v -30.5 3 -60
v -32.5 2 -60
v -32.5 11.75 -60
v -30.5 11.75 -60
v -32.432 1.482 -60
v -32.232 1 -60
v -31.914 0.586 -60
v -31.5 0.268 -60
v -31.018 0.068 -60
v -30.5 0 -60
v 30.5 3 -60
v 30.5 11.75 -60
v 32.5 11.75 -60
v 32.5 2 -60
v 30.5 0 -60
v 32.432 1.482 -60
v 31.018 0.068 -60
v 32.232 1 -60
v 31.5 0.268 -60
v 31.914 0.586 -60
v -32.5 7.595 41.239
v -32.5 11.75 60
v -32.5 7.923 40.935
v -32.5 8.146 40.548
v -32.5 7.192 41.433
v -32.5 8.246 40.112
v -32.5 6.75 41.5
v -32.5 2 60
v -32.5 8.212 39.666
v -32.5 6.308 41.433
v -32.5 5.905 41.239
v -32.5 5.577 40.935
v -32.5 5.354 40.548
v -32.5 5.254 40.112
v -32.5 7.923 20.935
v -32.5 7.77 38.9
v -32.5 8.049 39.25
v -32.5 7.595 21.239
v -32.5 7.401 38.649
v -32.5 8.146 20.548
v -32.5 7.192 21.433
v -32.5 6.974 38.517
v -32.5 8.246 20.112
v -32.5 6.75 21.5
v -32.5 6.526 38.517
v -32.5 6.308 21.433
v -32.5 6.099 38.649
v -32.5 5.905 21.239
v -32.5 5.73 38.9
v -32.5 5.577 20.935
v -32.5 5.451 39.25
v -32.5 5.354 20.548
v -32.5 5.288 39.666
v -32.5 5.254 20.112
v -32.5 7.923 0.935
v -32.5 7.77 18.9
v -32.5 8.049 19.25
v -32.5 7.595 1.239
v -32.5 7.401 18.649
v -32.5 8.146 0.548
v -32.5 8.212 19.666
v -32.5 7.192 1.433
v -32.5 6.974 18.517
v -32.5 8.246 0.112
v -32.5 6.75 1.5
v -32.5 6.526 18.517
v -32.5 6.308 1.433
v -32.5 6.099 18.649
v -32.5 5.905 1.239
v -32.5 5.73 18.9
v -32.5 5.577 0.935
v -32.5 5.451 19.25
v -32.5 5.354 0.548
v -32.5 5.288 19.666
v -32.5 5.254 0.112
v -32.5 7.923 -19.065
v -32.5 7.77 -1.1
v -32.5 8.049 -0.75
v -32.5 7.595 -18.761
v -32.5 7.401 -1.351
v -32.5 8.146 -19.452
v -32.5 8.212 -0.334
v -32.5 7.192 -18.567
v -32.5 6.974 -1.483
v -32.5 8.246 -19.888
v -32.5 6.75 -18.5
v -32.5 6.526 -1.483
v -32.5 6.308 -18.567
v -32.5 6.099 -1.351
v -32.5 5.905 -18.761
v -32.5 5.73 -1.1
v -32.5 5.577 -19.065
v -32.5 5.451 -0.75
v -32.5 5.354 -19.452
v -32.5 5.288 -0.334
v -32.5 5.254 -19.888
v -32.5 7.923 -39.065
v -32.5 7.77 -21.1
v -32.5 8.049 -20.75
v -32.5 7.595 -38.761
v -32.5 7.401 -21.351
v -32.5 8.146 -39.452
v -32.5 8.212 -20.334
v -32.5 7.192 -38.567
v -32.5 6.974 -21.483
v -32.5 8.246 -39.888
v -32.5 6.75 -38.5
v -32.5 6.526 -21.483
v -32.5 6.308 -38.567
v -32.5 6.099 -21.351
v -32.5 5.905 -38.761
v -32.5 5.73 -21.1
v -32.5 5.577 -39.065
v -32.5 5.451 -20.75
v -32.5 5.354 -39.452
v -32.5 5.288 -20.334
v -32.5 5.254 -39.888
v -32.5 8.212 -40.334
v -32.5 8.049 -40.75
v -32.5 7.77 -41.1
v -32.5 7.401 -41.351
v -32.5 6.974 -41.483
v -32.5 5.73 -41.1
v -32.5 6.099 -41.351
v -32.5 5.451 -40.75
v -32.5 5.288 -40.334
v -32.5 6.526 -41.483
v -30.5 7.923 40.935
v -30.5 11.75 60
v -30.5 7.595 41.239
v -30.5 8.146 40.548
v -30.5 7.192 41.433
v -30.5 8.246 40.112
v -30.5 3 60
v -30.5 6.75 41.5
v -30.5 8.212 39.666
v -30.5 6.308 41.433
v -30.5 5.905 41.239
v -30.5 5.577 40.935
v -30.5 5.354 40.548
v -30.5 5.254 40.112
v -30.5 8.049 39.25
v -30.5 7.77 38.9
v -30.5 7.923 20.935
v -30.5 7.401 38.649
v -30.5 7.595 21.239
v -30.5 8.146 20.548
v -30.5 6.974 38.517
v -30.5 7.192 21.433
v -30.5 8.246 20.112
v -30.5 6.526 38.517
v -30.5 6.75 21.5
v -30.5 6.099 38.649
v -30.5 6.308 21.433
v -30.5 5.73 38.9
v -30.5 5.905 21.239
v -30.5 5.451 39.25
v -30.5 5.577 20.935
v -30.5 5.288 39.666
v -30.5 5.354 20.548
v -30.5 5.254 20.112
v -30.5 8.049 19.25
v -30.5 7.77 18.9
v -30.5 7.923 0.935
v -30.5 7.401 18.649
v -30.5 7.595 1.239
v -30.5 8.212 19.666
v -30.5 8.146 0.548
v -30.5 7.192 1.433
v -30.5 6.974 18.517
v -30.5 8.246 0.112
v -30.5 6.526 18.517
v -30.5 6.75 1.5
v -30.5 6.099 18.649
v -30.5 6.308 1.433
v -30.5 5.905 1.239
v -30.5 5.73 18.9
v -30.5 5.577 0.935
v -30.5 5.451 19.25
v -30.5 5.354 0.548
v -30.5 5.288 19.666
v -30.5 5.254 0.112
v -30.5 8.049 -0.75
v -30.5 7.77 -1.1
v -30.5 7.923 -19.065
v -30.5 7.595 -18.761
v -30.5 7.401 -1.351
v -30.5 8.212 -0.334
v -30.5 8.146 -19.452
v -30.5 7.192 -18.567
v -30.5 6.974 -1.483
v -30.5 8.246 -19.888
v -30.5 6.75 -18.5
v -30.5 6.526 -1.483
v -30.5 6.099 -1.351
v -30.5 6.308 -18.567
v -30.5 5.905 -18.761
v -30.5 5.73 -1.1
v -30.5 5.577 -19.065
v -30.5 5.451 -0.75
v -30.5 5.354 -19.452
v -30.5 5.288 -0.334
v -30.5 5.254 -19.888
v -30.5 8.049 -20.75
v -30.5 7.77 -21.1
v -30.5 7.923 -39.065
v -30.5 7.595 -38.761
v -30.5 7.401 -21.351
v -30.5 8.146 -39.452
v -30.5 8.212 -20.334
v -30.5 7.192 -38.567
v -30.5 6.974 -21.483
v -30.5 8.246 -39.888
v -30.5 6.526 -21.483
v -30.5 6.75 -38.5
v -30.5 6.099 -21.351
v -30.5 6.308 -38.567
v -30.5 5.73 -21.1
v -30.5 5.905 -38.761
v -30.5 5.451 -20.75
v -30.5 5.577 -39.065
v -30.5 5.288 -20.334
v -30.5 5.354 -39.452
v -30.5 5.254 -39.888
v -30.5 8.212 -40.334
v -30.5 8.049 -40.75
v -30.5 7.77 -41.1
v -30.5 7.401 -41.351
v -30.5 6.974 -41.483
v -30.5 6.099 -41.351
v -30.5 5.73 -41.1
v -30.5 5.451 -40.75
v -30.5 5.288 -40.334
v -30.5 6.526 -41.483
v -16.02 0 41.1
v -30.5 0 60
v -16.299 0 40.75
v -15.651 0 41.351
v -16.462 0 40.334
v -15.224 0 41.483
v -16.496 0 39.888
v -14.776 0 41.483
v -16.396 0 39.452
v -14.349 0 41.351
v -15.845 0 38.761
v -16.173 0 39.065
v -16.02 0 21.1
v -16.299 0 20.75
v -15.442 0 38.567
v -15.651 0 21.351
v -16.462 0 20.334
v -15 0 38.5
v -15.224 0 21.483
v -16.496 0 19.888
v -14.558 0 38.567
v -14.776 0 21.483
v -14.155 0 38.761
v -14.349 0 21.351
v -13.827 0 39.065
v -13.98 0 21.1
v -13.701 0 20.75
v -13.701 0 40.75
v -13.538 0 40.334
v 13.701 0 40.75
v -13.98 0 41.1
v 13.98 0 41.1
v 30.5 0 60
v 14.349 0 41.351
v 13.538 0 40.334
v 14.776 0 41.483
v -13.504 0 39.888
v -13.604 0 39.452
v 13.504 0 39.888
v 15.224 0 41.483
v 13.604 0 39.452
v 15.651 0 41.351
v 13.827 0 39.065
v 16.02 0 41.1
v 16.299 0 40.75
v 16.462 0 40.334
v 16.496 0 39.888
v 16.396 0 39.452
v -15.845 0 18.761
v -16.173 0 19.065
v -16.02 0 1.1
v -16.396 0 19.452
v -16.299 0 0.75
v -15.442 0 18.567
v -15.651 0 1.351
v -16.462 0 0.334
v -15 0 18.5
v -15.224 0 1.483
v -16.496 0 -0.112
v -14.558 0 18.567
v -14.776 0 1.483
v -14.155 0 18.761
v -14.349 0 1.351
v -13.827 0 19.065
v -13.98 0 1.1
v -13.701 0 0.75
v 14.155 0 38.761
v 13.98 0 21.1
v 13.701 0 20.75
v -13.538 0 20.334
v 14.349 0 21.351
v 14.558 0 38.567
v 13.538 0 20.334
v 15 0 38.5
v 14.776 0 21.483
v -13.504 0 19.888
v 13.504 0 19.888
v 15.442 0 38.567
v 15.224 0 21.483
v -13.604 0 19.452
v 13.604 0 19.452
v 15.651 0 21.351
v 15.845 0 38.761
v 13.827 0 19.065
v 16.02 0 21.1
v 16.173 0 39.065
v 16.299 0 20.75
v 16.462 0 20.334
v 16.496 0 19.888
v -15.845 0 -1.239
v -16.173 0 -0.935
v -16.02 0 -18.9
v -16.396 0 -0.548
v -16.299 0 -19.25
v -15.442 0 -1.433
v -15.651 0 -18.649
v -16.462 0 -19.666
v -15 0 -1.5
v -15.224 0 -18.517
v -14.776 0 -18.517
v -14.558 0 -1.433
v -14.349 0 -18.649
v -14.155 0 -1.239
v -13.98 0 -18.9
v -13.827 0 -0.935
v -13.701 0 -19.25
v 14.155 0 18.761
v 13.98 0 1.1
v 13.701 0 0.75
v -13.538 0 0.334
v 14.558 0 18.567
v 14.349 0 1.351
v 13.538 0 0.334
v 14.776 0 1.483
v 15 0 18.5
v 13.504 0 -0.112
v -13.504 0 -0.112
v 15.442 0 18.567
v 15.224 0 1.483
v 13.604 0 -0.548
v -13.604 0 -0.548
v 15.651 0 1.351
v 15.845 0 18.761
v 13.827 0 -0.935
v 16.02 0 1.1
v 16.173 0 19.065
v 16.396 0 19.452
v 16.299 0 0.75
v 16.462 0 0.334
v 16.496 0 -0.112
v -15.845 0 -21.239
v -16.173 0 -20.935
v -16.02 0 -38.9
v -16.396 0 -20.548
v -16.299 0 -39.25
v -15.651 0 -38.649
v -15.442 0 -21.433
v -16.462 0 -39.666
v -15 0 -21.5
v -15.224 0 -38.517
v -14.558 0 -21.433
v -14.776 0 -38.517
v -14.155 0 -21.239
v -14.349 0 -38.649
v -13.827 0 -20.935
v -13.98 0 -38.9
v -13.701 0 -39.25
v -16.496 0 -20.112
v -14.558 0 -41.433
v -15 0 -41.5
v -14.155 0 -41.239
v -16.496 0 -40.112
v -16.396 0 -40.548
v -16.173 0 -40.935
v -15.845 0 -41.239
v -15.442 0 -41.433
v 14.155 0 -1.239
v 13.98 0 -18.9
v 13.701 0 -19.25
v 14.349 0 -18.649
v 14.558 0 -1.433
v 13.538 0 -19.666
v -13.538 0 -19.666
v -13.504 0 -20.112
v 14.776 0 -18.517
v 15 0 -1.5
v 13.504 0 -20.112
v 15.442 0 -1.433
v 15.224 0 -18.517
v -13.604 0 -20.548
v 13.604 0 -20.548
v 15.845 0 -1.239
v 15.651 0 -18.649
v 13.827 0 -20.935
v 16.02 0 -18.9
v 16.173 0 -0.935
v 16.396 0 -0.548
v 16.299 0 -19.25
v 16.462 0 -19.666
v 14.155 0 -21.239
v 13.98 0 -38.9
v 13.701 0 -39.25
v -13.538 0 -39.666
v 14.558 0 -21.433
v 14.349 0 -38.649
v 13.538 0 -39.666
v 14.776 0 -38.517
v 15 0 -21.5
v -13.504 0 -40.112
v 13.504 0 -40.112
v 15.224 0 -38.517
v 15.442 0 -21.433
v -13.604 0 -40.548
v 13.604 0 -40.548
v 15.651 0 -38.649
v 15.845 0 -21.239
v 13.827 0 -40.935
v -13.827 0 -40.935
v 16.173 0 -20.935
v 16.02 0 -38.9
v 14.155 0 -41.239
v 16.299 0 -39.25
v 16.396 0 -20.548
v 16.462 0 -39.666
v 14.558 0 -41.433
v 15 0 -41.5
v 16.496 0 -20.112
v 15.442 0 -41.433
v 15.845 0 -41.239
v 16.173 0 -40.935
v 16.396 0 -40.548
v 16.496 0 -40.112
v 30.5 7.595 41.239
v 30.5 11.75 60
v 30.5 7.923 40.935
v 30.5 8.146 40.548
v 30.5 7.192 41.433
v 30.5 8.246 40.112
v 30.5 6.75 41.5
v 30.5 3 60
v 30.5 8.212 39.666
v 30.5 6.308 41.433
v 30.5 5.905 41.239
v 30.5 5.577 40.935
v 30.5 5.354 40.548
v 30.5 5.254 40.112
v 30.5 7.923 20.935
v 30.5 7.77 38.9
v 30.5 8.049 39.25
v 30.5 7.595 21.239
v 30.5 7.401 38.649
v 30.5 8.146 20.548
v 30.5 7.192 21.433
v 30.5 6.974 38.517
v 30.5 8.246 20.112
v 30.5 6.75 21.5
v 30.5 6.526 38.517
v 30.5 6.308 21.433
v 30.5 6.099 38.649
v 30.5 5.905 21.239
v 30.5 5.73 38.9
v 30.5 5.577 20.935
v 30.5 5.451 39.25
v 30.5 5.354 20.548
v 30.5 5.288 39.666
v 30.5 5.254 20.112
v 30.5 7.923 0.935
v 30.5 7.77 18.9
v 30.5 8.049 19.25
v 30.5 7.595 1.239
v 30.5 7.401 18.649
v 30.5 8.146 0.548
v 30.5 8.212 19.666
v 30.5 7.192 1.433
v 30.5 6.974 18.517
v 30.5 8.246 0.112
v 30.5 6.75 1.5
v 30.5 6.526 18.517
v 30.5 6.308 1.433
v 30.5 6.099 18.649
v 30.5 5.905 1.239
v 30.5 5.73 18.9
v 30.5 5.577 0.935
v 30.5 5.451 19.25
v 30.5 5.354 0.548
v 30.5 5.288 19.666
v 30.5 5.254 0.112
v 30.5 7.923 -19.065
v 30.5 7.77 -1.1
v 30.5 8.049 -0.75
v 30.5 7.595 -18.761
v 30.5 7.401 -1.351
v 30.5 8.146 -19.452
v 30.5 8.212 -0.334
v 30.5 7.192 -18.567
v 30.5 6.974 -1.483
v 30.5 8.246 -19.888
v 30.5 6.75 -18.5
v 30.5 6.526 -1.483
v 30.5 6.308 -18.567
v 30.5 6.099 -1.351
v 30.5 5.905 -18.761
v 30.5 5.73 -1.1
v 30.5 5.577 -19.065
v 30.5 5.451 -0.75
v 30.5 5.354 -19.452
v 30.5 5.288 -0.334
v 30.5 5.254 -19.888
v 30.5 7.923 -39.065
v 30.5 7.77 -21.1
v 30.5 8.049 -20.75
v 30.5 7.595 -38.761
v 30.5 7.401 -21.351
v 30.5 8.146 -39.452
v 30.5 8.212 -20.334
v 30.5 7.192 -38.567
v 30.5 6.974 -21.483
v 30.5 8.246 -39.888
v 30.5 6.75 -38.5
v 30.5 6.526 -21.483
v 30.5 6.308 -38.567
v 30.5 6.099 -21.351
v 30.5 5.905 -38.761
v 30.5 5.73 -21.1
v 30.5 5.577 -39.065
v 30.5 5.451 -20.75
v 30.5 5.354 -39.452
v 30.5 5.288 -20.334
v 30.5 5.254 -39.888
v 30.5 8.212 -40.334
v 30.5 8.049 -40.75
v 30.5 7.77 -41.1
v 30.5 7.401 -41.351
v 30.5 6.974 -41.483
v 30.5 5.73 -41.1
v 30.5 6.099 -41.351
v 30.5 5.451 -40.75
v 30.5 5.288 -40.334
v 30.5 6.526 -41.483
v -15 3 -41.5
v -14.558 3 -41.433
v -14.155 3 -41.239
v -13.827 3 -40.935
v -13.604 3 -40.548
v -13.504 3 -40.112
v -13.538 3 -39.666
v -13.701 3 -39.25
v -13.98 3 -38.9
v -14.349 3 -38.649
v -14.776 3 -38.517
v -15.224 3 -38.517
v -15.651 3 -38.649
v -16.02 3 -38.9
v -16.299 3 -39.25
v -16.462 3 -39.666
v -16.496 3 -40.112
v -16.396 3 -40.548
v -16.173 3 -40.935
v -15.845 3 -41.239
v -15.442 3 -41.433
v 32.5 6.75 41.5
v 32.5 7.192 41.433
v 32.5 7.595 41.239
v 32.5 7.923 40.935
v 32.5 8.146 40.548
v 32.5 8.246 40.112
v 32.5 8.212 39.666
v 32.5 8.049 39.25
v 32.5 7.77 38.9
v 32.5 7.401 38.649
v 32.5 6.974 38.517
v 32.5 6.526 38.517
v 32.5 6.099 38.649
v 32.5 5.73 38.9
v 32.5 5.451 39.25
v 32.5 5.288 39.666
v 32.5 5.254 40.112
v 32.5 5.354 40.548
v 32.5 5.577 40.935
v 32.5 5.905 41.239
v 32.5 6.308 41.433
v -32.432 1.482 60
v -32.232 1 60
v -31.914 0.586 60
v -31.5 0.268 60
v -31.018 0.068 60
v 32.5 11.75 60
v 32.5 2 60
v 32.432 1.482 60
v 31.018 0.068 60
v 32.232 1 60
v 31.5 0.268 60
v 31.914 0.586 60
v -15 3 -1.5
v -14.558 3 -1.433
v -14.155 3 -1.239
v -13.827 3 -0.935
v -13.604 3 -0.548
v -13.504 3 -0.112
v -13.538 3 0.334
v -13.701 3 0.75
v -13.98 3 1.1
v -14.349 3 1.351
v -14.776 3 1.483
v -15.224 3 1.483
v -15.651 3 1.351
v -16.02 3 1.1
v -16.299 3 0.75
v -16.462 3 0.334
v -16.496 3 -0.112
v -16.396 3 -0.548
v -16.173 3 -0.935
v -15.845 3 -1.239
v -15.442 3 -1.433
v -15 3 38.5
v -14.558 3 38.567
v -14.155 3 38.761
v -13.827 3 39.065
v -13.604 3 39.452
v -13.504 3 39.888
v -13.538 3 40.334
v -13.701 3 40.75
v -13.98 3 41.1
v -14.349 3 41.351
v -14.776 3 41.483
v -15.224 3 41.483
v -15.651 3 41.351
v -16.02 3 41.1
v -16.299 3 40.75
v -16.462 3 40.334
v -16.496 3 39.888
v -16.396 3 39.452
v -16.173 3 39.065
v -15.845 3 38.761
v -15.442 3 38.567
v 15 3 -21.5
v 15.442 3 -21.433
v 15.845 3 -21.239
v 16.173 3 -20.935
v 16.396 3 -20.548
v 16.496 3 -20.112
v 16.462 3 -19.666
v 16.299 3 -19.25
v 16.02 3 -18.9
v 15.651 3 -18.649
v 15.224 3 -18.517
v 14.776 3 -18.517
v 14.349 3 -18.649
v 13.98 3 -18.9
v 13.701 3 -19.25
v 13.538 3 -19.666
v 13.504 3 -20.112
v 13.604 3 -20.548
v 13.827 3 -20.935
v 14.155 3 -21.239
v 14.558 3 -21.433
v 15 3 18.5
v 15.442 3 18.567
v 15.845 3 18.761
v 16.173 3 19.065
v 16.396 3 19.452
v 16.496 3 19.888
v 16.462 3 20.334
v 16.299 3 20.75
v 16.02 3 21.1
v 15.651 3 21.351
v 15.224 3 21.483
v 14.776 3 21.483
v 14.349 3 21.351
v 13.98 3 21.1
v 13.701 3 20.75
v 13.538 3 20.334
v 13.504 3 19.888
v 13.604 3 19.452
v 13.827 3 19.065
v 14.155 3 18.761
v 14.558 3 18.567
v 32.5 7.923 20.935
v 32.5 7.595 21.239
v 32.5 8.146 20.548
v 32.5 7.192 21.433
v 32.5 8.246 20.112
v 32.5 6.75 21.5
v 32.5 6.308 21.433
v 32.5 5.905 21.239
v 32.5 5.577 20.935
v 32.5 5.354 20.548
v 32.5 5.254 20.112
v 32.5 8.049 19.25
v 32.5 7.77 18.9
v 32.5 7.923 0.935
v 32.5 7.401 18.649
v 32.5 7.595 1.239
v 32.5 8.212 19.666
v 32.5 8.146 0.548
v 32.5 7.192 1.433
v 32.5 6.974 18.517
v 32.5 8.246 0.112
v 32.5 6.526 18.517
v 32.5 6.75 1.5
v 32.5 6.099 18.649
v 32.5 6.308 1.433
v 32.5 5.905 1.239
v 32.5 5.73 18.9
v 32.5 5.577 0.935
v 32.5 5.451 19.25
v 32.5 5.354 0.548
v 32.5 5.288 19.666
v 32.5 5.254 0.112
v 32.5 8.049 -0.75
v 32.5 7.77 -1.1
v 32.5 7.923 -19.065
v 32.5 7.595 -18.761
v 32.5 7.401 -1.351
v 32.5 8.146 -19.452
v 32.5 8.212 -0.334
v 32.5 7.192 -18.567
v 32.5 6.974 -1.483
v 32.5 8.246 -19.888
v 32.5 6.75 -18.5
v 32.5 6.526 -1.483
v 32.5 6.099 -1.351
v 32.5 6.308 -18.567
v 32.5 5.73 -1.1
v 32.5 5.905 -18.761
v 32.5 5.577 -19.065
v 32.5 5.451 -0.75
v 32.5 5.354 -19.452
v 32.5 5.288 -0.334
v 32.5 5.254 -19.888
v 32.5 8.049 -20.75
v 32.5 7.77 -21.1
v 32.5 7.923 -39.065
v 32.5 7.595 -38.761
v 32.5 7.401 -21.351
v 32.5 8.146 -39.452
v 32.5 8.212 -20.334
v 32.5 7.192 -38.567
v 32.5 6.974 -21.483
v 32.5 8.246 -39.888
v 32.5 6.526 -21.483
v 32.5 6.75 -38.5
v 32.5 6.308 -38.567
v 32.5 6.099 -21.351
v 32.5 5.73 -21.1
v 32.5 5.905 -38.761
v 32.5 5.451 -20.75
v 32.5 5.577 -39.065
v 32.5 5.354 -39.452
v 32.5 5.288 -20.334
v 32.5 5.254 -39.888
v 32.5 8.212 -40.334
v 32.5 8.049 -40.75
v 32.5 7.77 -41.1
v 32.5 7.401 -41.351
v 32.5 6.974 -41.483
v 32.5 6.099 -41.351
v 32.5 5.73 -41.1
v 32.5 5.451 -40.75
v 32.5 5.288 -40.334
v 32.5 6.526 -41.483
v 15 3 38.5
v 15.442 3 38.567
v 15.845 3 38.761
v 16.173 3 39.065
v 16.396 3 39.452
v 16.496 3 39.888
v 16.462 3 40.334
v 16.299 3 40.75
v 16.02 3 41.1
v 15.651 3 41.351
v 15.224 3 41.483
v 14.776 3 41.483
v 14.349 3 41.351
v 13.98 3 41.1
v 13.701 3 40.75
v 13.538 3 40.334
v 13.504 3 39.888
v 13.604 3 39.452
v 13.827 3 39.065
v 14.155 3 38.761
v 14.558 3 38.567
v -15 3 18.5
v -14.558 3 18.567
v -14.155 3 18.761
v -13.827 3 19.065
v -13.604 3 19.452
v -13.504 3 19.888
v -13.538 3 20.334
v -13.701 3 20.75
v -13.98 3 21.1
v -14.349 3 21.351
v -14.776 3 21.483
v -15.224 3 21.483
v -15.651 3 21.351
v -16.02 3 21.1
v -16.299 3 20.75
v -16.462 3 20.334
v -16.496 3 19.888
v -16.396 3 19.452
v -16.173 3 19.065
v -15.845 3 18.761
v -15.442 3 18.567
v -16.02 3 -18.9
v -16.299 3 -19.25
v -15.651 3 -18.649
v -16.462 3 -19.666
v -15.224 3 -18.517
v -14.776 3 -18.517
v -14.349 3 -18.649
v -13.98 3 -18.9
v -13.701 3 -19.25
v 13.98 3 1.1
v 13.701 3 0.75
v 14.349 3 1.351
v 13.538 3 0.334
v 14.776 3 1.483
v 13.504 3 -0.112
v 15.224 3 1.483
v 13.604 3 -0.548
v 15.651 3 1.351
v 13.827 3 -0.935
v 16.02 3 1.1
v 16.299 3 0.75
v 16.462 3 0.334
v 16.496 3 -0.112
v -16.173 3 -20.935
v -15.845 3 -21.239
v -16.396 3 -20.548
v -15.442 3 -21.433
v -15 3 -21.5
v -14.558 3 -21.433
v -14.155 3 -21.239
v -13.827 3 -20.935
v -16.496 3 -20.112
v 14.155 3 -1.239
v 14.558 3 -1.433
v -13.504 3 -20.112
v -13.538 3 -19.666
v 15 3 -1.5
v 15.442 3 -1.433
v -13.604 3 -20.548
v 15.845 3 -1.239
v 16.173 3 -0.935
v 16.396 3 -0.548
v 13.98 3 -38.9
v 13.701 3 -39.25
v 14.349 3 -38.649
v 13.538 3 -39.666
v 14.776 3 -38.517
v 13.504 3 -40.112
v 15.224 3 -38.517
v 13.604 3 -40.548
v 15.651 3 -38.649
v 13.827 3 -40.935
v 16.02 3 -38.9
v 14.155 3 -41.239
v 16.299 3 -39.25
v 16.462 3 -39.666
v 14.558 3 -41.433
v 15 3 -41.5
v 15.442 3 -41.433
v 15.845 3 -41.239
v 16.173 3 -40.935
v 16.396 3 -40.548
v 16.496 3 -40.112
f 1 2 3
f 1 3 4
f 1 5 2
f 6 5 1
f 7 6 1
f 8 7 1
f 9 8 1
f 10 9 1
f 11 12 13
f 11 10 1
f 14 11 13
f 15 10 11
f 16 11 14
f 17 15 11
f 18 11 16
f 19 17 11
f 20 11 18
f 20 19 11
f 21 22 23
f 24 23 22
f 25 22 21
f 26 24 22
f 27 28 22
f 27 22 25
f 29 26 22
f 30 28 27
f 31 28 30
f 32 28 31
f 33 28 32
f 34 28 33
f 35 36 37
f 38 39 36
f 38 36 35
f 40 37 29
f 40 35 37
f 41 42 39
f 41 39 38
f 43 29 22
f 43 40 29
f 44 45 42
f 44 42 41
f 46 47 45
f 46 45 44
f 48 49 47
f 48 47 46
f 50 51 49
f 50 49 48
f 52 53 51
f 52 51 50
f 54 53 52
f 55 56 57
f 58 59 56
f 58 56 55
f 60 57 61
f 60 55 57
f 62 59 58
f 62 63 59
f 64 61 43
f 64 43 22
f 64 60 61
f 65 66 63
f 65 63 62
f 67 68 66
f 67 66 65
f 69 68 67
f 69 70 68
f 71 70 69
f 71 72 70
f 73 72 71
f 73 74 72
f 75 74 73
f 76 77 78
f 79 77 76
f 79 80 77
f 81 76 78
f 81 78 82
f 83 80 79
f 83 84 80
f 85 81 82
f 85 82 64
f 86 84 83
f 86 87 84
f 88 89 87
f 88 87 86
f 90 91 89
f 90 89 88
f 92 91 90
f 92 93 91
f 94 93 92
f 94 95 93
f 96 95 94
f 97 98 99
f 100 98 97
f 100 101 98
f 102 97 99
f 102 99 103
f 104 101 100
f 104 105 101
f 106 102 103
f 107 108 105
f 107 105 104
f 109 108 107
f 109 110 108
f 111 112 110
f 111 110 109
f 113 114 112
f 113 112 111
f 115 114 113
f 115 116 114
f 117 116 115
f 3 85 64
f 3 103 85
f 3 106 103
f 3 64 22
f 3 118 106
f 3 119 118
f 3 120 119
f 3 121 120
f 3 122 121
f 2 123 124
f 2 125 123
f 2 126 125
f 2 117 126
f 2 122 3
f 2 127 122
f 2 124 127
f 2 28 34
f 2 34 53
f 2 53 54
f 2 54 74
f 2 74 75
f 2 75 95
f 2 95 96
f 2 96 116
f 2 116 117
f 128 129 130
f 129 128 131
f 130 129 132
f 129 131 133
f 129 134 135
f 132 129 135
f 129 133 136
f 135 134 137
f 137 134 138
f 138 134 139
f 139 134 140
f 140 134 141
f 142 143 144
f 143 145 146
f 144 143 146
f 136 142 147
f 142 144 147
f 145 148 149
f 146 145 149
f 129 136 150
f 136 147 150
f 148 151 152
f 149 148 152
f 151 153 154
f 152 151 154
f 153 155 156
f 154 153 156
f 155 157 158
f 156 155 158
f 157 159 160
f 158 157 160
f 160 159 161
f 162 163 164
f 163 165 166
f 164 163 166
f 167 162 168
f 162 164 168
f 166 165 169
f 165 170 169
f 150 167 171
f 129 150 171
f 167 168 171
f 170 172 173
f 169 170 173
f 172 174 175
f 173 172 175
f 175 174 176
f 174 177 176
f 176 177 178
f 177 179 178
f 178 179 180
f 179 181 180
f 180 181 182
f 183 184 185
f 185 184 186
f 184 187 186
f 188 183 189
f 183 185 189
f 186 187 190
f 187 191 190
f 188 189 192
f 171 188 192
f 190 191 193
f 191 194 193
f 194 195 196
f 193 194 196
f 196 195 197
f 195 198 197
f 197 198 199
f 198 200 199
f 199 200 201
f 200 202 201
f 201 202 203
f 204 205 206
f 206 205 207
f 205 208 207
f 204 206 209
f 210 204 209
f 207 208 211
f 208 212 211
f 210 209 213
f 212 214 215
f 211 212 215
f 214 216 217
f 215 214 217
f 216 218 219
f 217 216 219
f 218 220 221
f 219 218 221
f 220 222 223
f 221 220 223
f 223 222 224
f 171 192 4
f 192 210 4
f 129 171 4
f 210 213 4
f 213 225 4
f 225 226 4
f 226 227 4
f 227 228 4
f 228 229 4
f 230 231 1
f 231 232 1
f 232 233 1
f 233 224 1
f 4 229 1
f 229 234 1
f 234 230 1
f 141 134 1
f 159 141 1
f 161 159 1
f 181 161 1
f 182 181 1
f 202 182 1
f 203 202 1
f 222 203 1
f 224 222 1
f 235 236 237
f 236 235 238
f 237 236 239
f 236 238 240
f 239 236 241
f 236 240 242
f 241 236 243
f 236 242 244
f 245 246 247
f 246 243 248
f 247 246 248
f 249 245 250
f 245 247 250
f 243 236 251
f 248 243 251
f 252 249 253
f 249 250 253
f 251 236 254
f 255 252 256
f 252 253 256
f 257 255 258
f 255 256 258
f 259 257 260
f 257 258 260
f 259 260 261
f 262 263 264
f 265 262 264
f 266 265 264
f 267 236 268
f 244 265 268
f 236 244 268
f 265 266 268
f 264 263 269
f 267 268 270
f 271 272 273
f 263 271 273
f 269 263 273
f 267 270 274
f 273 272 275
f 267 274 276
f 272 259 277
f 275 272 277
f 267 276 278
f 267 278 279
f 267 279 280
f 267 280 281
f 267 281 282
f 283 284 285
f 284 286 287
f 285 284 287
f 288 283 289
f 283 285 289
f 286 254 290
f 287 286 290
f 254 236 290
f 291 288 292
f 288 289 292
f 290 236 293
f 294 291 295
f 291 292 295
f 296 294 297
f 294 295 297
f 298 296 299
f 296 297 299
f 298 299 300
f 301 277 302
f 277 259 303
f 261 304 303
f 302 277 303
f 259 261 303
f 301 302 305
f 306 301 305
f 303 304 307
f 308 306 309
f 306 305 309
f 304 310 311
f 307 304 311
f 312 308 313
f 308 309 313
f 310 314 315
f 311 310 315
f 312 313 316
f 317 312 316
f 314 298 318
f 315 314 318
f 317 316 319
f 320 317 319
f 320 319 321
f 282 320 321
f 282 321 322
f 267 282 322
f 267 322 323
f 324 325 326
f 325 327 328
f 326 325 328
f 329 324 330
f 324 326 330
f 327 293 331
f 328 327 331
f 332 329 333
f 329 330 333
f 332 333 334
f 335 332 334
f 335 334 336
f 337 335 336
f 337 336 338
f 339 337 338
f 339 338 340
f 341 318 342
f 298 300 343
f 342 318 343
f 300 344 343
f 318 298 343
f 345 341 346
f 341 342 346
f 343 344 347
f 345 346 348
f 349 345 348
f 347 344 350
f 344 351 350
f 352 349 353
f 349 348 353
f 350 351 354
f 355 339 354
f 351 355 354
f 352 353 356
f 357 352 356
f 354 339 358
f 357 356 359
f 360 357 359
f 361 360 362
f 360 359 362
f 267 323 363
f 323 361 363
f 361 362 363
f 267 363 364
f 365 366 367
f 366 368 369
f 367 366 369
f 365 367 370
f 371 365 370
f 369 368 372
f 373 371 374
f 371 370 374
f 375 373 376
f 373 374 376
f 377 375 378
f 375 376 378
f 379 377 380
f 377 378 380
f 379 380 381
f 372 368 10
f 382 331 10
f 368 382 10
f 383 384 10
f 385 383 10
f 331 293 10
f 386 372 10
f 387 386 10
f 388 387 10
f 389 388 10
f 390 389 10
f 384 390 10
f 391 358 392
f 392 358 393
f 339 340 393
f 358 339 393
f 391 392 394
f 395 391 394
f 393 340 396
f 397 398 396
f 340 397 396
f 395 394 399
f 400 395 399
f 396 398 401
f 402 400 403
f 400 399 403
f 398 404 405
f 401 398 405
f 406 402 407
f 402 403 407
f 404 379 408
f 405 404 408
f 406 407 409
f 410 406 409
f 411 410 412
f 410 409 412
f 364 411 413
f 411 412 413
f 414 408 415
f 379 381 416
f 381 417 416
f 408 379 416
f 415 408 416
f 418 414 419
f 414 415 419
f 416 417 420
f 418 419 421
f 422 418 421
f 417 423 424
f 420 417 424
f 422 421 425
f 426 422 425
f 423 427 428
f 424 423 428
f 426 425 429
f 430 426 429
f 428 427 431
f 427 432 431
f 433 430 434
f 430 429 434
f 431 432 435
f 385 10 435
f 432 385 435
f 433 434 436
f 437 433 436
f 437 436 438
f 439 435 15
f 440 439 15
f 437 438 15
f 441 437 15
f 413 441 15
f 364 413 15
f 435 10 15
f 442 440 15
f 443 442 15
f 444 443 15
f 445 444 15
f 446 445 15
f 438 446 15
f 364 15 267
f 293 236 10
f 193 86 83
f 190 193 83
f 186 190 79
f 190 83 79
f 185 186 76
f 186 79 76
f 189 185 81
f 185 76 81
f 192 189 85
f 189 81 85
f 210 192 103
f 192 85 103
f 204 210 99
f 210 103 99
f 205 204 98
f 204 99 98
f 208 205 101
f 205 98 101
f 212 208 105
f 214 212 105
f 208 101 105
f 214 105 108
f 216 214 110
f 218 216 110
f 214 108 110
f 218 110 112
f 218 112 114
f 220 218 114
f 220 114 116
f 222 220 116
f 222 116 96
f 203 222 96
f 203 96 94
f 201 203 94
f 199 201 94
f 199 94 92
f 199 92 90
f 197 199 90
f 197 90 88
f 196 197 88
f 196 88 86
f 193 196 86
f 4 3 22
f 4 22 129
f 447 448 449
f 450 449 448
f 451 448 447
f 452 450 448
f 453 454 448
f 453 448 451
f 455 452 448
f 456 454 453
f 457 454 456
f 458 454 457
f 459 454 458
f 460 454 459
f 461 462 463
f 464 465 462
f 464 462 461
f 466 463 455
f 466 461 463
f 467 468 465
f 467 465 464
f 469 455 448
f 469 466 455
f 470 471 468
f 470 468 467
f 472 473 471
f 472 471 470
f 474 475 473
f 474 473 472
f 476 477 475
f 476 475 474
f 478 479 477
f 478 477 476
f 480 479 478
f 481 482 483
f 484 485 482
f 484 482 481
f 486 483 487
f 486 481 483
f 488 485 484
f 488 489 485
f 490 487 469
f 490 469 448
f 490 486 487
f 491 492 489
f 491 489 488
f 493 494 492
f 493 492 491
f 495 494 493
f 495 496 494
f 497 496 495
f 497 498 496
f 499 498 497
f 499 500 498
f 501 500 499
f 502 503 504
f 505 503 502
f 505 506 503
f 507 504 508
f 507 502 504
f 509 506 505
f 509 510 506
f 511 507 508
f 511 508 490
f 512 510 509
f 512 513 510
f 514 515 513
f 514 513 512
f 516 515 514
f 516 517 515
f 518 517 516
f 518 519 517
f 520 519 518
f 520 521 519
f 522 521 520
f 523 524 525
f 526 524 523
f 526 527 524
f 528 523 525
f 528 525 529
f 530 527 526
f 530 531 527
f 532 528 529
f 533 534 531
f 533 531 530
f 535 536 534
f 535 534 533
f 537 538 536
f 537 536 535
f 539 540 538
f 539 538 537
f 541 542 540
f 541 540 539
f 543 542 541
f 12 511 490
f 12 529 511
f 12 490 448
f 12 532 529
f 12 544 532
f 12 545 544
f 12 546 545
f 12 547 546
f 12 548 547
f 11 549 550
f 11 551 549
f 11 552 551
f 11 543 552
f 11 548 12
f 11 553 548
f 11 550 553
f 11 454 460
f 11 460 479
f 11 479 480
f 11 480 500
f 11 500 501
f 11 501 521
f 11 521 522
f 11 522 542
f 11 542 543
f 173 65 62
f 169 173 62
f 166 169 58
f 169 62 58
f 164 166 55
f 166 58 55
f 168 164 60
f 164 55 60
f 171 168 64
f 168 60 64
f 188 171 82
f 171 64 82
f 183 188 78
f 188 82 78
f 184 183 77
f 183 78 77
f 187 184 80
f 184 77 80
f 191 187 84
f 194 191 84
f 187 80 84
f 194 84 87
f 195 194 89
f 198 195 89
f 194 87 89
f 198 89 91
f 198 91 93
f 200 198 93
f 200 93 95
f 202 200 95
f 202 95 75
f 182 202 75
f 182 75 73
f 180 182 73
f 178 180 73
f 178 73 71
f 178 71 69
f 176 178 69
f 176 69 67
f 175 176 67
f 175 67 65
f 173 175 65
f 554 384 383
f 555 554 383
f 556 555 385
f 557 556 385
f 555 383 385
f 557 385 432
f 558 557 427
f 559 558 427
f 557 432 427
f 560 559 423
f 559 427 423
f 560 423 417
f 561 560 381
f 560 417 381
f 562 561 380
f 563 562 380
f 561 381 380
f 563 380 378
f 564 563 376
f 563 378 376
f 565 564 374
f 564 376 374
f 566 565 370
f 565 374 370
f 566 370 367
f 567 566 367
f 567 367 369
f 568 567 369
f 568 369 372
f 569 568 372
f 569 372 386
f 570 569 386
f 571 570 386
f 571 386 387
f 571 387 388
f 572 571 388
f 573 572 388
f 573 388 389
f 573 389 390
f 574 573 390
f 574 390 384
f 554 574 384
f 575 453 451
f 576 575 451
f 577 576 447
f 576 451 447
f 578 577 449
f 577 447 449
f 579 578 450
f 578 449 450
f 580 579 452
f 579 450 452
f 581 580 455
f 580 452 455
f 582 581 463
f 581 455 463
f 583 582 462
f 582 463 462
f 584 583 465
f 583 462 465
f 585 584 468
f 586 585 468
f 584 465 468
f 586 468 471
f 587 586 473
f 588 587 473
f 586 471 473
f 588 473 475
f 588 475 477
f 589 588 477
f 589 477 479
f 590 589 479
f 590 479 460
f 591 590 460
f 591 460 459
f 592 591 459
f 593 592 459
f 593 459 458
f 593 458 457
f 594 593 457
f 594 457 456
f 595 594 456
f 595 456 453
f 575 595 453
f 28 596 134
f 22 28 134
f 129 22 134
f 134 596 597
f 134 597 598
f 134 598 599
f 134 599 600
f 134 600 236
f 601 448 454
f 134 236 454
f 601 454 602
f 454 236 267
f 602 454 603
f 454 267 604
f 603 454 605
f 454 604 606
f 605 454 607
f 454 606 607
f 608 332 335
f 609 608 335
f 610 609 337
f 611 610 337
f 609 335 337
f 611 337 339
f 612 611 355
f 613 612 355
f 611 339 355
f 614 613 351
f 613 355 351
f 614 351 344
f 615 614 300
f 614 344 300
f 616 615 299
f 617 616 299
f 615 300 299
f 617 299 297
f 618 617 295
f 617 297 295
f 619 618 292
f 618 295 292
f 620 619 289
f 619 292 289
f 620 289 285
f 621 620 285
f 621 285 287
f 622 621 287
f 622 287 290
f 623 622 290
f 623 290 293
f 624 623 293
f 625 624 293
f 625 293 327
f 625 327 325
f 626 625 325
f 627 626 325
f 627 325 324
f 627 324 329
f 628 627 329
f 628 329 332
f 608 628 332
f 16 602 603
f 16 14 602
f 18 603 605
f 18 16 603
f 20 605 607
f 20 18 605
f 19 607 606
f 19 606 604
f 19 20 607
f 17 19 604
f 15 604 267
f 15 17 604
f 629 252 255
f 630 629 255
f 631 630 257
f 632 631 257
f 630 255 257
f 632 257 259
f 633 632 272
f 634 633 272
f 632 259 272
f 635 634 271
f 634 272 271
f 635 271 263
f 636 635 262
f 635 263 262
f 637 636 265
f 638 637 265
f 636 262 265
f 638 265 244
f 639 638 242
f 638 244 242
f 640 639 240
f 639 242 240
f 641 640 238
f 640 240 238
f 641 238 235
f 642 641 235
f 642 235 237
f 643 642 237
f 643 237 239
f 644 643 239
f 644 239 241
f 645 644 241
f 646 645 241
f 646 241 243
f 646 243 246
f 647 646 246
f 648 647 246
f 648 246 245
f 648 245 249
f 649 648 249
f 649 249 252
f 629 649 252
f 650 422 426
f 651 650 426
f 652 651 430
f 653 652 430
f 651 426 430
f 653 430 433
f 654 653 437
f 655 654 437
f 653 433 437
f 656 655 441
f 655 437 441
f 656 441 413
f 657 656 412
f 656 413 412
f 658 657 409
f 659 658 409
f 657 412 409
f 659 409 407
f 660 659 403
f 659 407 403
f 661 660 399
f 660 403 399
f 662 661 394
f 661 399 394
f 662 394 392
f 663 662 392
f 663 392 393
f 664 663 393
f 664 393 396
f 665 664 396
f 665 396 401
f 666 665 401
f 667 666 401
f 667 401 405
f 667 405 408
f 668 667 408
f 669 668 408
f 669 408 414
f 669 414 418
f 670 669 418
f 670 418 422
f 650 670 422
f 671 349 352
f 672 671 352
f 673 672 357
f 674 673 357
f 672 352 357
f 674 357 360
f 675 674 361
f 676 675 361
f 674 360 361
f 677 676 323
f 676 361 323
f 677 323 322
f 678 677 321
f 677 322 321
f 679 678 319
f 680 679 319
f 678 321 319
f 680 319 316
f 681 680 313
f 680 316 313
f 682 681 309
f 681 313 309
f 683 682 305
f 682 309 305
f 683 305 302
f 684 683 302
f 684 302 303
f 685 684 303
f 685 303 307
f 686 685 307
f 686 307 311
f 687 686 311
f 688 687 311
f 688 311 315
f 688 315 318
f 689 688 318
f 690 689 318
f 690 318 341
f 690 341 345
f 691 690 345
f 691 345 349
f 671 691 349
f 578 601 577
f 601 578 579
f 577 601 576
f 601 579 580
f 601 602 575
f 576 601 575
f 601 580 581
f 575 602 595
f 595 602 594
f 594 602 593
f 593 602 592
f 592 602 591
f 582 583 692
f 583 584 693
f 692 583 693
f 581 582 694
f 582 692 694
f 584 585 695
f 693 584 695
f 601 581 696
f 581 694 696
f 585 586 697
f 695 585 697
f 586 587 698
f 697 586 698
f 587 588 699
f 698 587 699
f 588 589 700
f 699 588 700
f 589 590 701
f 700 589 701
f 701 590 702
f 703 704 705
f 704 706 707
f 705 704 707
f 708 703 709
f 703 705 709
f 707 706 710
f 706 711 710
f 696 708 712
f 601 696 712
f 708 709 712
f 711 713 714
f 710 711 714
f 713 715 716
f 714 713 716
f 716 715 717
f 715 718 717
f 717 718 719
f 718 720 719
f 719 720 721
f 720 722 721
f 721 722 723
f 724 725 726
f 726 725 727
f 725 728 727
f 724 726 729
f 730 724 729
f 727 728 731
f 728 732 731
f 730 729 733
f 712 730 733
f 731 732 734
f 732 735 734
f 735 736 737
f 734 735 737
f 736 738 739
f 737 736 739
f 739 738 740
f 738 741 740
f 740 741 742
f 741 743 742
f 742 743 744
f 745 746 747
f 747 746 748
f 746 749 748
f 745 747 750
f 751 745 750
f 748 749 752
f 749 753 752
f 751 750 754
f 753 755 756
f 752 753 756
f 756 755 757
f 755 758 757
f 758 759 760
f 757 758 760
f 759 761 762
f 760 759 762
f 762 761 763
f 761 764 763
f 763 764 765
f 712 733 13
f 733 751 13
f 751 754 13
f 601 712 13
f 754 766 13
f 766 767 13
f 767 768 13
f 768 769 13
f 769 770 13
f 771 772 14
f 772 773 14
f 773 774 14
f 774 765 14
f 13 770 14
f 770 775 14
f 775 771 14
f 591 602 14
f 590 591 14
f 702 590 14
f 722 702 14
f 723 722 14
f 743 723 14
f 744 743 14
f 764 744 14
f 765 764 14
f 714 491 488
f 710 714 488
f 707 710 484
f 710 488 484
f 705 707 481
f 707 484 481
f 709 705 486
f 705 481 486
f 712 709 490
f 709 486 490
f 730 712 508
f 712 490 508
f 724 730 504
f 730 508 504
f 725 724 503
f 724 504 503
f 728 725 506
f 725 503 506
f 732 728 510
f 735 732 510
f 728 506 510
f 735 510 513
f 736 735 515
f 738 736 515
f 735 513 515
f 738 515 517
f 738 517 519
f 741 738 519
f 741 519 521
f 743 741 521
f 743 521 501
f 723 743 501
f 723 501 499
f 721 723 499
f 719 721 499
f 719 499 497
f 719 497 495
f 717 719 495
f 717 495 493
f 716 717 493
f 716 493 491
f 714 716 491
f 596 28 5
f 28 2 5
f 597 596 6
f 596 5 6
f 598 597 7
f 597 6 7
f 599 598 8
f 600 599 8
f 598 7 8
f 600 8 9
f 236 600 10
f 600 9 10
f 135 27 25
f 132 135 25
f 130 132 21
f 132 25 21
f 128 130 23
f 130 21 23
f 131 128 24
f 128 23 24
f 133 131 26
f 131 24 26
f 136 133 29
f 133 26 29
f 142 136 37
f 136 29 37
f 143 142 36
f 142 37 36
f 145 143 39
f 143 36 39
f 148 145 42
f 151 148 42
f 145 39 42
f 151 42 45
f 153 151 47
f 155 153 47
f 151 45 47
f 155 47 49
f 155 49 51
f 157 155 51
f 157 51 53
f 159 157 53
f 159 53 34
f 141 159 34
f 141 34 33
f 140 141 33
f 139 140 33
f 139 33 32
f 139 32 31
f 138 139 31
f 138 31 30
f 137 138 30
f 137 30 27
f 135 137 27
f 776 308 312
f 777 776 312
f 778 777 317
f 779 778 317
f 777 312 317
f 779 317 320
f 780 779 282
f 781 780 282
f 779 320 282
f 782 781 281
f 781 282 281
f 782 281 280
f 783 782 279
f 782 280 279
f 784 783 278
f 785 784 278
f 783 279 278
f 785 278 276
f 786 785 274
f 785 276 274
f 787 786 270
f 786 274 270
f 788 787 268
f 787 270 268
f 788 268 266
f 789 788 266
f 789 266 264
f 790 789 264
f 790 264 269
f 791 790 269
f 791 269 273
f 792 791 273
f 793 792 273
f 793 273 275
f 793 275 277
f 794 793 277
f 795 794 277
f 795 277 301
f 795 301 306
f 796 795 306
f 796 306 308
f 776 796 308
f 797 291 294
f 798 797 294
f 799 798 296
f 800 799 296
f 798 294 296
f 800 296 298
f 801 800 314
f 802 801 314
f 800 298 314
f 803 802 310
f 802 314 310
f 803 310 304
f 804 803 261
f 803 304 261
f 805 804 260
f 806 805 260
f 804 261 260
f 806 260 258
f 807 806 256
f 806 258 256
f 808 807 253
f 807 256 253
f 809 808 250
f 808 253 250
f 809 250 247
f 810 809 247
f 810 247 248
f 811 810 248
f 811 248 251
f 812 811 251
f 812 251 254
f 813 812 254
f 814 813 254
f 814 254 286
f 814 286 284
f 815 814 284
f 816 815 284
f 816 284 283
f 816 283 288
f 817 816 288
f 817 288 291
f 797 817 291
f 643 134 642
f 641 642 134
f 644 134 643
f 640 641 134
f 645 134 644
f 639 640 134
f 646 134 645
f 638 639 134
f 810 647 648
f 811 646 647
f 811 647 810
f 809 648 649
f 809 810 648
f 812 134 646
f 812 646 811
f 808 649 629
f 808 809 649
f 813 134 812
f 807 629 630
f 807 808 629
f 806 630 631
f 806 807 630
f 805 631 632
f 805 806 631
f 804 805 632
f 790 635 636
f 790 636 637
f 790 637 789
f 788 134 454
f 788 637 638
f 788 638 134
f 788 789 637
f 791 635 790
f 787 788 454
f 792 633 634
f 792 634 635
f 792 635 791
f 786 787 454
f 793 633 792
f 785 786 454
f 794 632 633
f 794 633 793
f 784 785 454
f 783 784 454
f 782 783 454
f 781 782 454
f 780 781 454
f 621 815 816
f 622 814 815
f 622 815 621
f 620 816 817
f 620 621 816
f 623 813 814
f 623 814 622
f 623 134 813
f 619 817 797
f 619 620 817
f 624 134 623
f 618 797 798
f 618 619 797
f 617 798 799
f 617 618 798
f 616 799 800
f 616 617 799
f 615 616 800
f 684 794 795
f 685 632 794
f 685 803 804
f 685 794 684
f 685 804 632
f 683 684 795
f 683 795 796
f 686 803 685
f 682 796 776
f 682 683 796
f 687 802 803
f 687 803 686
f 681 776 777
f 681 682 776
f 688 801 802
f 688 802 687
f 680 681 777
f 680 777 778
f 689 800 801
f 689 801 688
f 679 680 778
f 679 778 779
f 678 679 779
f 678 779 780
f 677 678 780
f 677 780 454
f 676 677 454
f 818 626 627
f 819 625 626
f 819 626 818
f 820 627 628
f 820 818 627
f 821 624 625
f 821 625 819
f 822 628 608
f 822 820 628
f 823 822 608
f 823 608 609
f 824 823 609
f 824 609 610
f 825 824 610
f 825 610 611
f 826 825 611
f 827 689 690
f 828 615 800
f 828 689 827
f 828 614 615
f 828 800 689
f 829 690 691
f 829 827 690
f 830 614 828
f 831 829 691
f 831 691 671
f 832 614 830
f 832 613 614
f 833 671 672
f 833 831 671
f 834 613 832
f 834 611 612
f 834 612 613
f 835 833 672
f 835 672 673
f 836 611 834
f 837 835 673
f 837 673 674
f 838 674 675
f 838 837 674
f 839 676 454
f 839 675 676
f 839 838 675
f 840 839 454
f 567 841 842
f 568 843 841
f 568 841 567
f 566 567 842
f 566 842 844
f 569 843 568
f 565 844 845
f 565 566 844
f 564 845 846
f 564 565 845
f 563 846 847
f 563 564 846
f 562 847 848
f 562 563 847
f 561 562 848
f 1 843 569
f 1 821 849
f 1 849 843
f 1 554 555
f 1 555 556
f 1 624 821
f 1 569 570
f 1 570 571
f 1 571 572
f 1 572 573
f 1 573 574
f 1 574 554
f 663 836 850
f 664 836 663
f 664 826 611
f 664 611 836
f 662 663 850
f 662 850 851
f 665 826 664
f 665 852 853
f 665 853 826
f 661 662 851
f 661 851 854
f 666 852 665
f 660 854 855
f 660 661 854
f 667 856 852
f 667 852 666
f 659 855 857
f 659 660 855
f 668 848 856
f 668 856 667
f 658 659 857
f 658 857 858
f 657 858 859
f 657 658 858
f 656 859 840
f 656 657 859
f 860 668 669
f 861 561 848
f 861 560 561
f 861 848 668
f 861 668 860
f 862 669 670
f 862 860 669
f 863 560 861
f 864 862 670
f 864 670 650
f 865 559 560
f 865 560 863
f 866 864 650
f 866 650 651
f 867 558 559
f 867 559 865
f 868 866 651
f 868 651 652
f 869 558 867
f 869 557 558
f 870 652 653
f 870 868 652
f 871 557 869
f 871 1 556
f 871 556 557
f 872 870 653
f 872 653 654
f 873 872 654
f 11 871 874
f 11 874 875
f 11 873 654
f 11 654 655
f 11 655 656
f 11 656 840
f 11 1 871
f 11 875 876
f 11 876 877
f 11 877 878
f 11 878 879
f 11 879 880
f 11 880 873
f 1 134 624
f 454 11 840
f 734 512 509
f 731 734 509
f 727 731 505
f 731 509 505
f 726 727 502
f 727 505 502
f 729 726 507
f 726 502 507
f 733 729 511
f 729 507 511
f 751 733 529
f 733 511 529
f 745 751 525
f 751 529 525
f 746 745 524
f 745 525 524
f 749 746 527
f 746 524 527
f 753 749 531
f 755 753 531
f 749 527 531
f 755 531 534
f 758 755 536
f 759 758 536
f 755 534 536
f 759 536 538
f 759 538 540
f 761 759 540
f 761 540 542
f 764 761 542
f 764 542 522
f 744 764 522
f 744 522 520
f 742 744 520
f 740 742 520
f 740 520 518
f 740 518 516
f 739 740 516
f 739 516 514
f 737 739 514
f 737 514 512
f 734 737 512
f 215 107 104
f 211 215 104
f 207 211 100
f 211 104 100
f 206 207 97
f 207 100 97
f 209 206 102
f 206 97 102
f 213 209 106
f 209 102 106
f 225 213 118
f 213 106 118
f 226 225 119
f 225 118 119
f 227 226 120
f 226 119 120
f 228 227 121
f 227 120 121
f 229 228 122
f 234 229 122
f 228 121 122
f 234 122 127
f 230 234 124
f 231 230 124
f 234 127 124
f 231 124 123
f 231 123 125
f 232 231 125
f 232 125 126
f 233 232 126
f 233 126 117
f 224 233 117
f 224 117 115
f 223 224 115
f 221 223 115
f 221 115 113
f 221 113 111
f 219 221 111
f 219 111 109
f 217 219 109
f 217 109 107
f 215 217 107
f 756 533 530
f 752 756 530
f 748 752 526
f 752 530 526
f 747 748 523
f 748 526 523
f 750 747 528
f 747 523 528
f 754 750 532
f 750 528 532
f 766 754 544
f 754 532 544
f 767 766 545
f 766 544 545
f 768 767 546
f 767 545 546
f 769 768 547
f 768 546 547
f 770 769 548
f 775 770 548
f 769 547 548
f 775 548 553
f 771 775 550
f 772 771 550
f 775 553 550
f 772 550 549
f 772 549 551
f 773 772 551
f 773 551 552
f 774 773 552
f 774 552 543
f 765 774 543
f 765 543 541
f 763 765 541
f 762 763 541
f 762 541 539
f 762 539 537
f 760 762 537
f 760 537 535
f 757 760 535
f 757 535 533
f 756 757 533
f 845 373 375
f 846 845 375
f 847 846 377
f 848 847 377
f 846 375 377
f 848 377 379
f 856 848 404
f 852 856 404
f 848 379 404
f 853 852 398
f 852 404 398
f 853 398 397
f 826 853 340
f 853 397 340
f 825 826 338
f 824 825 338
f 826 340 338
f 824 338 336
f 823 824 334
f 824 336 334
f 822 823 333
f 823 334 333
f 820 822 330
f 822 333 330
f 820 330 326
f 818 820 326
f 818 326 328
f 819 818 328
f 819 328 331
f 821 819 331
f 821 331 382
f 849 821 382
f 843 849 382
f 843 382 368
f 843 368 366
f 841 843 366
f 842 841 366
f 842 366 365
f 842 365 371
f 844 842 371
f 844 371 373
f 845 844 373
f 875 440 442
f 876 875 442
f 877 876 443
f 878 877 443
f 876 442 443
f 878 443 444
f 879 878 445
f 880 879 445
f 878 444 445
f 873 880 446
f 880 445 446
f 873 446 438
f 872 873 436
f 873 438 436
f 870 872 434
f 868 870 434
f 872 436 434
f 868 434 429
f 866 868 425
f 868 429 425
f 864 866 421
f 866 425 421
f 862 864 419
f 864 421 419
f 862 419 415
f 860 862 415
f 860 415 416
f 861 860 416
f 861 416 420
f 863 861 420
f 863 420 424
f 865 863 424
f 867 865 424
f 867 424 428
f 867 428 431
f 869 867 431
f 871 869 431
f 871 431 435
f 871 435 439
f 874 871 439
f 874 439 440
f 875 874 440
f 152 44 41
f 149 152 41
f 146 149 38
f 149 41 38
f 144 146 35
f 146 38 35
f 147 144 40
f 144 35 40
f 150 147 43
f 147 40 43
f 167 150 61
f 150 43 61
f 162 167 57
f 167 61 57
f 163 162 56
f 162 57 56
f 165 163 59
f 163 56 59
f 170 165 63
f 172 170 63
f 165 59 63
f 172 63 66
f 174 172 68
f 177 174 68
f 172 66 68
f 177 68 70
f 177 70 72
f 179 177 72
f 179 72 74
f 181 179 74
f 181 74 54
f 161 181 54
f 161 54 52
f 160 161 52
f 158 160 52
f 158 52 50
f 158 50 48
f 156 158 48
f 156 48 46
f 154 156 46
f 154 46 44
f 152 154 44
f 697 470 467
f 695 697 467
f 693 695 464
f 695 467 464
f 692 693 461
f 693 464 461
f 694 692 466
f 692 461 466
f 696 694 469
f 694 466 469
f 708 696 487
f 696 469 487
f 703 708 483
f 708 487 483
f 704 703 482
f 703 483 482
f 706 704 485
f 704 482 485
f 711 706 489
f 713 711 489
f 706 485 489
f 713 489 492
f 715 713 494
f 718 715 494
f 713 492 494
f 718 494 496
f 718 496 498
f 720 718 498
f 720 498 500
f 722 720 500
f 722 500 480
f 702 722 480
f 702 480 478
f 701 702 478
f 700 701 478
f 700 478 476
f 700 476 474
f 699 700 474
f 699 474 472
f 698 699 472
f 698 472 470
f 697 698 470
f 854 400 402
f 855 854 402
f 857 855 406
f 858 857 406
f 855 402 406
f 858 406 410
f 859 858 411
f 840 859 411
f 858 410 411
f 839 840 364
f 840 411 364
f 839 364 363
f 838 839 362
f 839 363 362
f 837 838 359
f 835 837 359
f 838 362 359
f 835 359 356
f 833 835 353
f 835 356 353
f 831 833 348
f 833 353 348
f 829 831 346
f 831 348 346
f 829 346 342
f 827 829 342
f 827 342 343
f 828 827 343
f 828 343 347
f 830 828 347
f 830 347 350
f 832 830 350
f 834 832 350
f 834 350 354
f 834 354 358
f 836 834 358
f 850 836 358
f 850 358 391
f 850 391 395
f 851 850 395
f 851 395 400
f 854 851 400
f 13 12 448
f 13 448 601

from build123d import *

# Parameters (mm, degrees)
SKETCH_1_W          = 65
SKETCH_1_H          = 120
EXTRUDE_1_DEPTH     = 3
SKETCH_2_W          = 2
SKETCH_2_H          = 120
EXTRUDE_2_DEPTH     = 8.75
FILLET_1_R          = 2
SKETCH_3_R          = 1.5
CUT_EXTRUDE_1_DEPTH = 70.240974141
SKETCH_4_R          = 1.5
CUT_EXTRUDE_2_DEPTH = 90.235993299


with BuildPart() as part:
    # 草图1 → 凸台-拉伸1 (new body)
    with BuildSketch(Plane(origin=(0, 0, 0), x_dir=(1, 0, 0), z_dir=(0, 1, 0))):
        Rectangle(SKETCH_1_W, SKETCH_1_H)
    extrude(amount=EXTRUDE_1_DEPTH)

    # 草图2 → 凸台-拉伸2 (add)
    with BuildSketch(Plane(origin=(0, 3, 0), x_dir=(1, 0, 0), z_dir=(0, 1, 0))):
        with Locations((-31.5, 0)):
            Rectangle(SKETCH_2_W, SKETCH_2_H)
        with Locations((31.5, 0)):
            Rectangle(SKETCH_2_W, SKETCH_2_H)
    extrude(amount=EXTRUDE_2_DEPTH)

    # 圆角1
    fillet_1_edges = [part.edges().sort_by_distance(p)[0] for p in [
        (-32.5, 0, 0),
        (32.5, 0, 0),
    ]]
    fillet(fillet_1_edges, radius=FILLET_1_R)

    # 草图3 → 切除-拉伸1 (cut, through all)
    with BuildSketch(Plane.XZ):
        with Locations(Location((-15, 40, 0), (0, 0, 270))):
            Circle(SKETCH_3_R)
        with Locations(Location((15, 40, 0), (0, 0, 270))):
            Circle(SKETCH_3_R)
        with Locations(Location((-15, 20, 0), (0, 0, 270))):
            Circle(SKETCH_3_R)
        with Locations(Location((15, 20, 0), (0, 0, 270))):
            Circle(SKETCH_3_R)
        with Locations(Location((-15, 0, 0), (0, 0, 270))):
            Circle(SKETCH_3_R)
        with Locations(Location((15, 0, 0), (0, 0, 270))):
            Circle(SKETCH_3_R)
        with Locations(Location((-15, -20, 0), (0, 0, 270))):
            Circle(SKETCH_3_R)
        with Locations(Location((15, -20, 0), (0, 0, 270))):
            Circle(SKETCH_3_R)
        with Locations(Location((-15, -40, 0), (0, 0, 270))):
            Circle(SKETCH_3_R)
        with Locations(Location((15, -40, 0), (0, 0, 270))):
            Circle(SKETCH_3_R)
    extrude(amount=-CUT_EXTRUDE_1_DEPTH, mode=Mode.SUBTRACT)

    # 草图4 → 切除-拉伸2 (cut, through all)
    with BuildSketch(Plane.ZY.offset(32.5)):
        with Locations((0, 6.75)):
            Circle(SKETCH_4_R)
        with Locations((-20, 6.75)):
            Circle(SKETCH_4_R)
        with Locations((-40, 6.75)):
            Circle(SKETCH_4_R)
        with Locations((20, 6.75)):
            Circle(SKETCH_4_R)
        with Locations((40, 6.75)):
            Circle(SKETCH_4_R)
    extrude(amount=-CUT_EXTRUDE_2_DEPTH, mode=Mode.SUBTRACT)


solid = part.part
